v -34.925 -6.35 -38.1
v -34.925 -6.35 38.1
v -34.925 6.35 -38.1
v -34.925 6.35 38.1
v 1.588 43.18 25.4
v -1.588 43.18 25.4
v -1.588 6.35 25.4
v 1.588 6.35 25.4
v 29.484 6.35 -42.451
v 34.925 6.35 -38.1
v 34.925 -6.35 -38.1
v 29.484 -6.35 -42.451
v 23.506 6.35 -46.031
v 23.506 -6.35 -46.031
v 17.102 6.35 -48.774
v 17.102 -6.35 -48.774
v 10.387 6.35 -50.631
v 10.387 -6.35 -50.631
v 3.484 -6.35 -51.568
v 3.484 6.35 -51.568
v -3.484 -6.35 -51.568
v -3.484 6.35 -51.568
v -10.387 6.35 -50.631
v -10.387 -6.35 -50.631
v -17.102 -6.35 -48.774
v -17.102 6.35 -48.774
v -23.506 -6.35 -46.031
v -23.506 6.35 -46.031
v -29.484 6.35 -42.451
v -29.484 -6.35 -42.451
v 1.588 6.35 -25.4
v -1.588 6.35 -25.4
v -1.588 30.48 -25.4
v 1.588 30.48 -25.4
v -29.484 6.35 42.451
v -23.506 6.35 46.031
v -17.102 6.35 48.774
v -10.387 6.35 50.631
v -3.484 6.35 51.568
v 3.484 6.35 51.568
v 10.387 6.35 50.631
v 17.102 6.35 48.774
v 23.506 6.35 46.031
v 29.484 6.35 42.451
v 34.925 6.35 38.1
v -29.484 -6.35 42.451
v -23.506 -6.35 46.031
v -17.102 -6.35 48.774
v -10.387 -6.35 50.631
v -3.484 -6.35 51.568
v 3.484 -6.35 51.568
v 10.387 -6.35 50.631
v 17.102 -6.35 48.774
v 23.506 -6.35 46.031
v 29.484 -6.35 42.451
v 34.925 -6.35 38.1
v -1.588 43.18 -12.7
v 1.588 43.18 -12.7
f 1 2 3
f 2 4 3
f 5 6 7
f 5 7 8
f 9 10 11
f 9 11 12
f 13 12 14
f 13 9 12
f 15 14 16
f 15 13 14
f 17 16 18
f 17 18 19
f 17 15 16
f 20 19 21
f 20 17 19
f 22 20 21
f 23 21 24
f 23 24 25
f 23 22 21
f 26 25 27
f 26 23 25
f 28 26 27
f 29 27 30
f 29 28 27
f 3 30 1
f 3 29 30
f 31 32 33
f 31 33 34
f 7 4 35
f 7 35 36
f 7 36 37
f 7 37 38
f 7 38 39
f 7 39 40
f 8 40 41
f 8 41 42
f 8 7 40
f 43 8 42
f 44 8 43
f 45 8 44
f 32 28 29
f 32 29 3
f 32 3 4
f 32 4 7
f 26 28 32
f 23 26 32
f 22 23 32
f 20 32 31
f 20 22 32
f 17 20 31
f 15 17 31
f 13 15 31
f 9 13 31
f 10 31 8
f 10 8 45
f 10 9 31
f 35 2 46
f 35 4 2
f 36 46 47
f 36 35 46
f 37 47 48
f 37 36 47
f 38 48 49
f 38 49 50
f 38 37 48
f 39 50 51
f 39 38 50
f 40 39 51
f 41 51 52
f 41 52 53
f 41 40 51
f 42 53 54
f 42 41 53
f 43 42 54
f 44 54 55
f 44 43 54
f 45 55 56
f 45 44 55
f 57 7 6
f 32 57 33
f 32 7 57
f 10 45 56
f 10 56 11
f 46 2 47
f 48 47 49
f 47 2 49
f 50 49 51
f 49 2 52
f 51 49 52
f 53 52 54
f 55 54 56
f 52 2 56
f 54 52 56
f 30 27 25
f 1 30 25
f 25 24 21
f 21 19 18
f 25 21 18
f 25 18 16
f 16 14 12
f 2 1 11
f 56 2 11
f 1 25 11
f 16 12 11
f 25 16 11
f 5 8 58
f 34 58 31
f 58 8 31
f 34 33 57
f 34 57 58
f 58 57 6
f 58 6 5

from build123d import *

# Parameters (mm, degrees)
SKETCH1_W                = 69.85
SKETCH1_H                = 76.2
SKETCH1_W_2              = 3.175
SKETCH1_H_2              = 50.8
BOSS_EXTRUDE1_DEPTH      = 6.35
BOSS_EXTRUDE2_DEPTH      = 43.18
BOSS_EXTRUDE2_DEPTH_BACK = 6.35
SKETCH1_3_W              = 3.175
SKETCH1_3_H              = 50.8
CHAMFER1_SIZE            = 12.7


with BuildPart() as part:
    # Sketch1 → Boss-Extrude1 (new, symmetric)
    # profile 1 of 3: a face of its own
    with BuildSketch(Plane(origin=(0, 0, 0), x_dir=(1, 0, 0), z_dir=(0, 1, 0))):
        Rectangle(SKETCH1_W, SKETCH1_H)
        Rectangle(SKETCH1_W_2, SKETCH1_H_2, mode=Mode.SUBTRACT)
    # profile 2 of 3: a face of its own
    with BuildSketch(Plane(origin=(0, 0, 0), x_dir=(1, 0, 0), z_dir=(0, 1, 0))):
        with BuildLine():
            Line((-34.925, 38.1), (34.925, 38.1))
            ThreePointArc((34.925, 38.1), (0, 51.685255393), (-34.925, 38.1))
        make_face()
    # profile 3 of 3: a face of its own
    with BuildSketch(Plane(origin=(0, 0, 0), x_dir=(1, 0, 0), z_dir=(0, 1, 0))):
        with BuildLine():
            ThreePointArc((-34.925, -38.1), (0, -51.685255393), (34.925, -38.1))
            Line((34.925, -38.1), (-34.925, -38.1))
        make_face()
    extrude(amount=BOSS_EXTRUDE1_DEPTH, both=True)

    # Sketch1<3> → Boss-Extrude2 (add, two sides: drawn at the far end of the back side and taken through both)
    with BuildSketch(Plane(origin=(0, 0, 0), x_dir=(1, 0, 0), z_dir=(0, 1, 0)).offset(-BOSS_EXTRUDE2_DEPTH_BACK)):
        Rectangle(SKETCH1_3_W, SKETCH1_3_H)
    extrude(amount=BOSS_EXTRUDE2_DEPTH + BOSS_EXTRUDE2_DEPTH_BACK)

    # Chamfer1
    chamfer1_edges = [part.edges().sort_by_distance(p)[0] for p in [
        (0, 43.18, -25.4),
    ]]
    chamfer(chamfer1_edges, length=CHAMFER1_SIZE)


solid = part.part
